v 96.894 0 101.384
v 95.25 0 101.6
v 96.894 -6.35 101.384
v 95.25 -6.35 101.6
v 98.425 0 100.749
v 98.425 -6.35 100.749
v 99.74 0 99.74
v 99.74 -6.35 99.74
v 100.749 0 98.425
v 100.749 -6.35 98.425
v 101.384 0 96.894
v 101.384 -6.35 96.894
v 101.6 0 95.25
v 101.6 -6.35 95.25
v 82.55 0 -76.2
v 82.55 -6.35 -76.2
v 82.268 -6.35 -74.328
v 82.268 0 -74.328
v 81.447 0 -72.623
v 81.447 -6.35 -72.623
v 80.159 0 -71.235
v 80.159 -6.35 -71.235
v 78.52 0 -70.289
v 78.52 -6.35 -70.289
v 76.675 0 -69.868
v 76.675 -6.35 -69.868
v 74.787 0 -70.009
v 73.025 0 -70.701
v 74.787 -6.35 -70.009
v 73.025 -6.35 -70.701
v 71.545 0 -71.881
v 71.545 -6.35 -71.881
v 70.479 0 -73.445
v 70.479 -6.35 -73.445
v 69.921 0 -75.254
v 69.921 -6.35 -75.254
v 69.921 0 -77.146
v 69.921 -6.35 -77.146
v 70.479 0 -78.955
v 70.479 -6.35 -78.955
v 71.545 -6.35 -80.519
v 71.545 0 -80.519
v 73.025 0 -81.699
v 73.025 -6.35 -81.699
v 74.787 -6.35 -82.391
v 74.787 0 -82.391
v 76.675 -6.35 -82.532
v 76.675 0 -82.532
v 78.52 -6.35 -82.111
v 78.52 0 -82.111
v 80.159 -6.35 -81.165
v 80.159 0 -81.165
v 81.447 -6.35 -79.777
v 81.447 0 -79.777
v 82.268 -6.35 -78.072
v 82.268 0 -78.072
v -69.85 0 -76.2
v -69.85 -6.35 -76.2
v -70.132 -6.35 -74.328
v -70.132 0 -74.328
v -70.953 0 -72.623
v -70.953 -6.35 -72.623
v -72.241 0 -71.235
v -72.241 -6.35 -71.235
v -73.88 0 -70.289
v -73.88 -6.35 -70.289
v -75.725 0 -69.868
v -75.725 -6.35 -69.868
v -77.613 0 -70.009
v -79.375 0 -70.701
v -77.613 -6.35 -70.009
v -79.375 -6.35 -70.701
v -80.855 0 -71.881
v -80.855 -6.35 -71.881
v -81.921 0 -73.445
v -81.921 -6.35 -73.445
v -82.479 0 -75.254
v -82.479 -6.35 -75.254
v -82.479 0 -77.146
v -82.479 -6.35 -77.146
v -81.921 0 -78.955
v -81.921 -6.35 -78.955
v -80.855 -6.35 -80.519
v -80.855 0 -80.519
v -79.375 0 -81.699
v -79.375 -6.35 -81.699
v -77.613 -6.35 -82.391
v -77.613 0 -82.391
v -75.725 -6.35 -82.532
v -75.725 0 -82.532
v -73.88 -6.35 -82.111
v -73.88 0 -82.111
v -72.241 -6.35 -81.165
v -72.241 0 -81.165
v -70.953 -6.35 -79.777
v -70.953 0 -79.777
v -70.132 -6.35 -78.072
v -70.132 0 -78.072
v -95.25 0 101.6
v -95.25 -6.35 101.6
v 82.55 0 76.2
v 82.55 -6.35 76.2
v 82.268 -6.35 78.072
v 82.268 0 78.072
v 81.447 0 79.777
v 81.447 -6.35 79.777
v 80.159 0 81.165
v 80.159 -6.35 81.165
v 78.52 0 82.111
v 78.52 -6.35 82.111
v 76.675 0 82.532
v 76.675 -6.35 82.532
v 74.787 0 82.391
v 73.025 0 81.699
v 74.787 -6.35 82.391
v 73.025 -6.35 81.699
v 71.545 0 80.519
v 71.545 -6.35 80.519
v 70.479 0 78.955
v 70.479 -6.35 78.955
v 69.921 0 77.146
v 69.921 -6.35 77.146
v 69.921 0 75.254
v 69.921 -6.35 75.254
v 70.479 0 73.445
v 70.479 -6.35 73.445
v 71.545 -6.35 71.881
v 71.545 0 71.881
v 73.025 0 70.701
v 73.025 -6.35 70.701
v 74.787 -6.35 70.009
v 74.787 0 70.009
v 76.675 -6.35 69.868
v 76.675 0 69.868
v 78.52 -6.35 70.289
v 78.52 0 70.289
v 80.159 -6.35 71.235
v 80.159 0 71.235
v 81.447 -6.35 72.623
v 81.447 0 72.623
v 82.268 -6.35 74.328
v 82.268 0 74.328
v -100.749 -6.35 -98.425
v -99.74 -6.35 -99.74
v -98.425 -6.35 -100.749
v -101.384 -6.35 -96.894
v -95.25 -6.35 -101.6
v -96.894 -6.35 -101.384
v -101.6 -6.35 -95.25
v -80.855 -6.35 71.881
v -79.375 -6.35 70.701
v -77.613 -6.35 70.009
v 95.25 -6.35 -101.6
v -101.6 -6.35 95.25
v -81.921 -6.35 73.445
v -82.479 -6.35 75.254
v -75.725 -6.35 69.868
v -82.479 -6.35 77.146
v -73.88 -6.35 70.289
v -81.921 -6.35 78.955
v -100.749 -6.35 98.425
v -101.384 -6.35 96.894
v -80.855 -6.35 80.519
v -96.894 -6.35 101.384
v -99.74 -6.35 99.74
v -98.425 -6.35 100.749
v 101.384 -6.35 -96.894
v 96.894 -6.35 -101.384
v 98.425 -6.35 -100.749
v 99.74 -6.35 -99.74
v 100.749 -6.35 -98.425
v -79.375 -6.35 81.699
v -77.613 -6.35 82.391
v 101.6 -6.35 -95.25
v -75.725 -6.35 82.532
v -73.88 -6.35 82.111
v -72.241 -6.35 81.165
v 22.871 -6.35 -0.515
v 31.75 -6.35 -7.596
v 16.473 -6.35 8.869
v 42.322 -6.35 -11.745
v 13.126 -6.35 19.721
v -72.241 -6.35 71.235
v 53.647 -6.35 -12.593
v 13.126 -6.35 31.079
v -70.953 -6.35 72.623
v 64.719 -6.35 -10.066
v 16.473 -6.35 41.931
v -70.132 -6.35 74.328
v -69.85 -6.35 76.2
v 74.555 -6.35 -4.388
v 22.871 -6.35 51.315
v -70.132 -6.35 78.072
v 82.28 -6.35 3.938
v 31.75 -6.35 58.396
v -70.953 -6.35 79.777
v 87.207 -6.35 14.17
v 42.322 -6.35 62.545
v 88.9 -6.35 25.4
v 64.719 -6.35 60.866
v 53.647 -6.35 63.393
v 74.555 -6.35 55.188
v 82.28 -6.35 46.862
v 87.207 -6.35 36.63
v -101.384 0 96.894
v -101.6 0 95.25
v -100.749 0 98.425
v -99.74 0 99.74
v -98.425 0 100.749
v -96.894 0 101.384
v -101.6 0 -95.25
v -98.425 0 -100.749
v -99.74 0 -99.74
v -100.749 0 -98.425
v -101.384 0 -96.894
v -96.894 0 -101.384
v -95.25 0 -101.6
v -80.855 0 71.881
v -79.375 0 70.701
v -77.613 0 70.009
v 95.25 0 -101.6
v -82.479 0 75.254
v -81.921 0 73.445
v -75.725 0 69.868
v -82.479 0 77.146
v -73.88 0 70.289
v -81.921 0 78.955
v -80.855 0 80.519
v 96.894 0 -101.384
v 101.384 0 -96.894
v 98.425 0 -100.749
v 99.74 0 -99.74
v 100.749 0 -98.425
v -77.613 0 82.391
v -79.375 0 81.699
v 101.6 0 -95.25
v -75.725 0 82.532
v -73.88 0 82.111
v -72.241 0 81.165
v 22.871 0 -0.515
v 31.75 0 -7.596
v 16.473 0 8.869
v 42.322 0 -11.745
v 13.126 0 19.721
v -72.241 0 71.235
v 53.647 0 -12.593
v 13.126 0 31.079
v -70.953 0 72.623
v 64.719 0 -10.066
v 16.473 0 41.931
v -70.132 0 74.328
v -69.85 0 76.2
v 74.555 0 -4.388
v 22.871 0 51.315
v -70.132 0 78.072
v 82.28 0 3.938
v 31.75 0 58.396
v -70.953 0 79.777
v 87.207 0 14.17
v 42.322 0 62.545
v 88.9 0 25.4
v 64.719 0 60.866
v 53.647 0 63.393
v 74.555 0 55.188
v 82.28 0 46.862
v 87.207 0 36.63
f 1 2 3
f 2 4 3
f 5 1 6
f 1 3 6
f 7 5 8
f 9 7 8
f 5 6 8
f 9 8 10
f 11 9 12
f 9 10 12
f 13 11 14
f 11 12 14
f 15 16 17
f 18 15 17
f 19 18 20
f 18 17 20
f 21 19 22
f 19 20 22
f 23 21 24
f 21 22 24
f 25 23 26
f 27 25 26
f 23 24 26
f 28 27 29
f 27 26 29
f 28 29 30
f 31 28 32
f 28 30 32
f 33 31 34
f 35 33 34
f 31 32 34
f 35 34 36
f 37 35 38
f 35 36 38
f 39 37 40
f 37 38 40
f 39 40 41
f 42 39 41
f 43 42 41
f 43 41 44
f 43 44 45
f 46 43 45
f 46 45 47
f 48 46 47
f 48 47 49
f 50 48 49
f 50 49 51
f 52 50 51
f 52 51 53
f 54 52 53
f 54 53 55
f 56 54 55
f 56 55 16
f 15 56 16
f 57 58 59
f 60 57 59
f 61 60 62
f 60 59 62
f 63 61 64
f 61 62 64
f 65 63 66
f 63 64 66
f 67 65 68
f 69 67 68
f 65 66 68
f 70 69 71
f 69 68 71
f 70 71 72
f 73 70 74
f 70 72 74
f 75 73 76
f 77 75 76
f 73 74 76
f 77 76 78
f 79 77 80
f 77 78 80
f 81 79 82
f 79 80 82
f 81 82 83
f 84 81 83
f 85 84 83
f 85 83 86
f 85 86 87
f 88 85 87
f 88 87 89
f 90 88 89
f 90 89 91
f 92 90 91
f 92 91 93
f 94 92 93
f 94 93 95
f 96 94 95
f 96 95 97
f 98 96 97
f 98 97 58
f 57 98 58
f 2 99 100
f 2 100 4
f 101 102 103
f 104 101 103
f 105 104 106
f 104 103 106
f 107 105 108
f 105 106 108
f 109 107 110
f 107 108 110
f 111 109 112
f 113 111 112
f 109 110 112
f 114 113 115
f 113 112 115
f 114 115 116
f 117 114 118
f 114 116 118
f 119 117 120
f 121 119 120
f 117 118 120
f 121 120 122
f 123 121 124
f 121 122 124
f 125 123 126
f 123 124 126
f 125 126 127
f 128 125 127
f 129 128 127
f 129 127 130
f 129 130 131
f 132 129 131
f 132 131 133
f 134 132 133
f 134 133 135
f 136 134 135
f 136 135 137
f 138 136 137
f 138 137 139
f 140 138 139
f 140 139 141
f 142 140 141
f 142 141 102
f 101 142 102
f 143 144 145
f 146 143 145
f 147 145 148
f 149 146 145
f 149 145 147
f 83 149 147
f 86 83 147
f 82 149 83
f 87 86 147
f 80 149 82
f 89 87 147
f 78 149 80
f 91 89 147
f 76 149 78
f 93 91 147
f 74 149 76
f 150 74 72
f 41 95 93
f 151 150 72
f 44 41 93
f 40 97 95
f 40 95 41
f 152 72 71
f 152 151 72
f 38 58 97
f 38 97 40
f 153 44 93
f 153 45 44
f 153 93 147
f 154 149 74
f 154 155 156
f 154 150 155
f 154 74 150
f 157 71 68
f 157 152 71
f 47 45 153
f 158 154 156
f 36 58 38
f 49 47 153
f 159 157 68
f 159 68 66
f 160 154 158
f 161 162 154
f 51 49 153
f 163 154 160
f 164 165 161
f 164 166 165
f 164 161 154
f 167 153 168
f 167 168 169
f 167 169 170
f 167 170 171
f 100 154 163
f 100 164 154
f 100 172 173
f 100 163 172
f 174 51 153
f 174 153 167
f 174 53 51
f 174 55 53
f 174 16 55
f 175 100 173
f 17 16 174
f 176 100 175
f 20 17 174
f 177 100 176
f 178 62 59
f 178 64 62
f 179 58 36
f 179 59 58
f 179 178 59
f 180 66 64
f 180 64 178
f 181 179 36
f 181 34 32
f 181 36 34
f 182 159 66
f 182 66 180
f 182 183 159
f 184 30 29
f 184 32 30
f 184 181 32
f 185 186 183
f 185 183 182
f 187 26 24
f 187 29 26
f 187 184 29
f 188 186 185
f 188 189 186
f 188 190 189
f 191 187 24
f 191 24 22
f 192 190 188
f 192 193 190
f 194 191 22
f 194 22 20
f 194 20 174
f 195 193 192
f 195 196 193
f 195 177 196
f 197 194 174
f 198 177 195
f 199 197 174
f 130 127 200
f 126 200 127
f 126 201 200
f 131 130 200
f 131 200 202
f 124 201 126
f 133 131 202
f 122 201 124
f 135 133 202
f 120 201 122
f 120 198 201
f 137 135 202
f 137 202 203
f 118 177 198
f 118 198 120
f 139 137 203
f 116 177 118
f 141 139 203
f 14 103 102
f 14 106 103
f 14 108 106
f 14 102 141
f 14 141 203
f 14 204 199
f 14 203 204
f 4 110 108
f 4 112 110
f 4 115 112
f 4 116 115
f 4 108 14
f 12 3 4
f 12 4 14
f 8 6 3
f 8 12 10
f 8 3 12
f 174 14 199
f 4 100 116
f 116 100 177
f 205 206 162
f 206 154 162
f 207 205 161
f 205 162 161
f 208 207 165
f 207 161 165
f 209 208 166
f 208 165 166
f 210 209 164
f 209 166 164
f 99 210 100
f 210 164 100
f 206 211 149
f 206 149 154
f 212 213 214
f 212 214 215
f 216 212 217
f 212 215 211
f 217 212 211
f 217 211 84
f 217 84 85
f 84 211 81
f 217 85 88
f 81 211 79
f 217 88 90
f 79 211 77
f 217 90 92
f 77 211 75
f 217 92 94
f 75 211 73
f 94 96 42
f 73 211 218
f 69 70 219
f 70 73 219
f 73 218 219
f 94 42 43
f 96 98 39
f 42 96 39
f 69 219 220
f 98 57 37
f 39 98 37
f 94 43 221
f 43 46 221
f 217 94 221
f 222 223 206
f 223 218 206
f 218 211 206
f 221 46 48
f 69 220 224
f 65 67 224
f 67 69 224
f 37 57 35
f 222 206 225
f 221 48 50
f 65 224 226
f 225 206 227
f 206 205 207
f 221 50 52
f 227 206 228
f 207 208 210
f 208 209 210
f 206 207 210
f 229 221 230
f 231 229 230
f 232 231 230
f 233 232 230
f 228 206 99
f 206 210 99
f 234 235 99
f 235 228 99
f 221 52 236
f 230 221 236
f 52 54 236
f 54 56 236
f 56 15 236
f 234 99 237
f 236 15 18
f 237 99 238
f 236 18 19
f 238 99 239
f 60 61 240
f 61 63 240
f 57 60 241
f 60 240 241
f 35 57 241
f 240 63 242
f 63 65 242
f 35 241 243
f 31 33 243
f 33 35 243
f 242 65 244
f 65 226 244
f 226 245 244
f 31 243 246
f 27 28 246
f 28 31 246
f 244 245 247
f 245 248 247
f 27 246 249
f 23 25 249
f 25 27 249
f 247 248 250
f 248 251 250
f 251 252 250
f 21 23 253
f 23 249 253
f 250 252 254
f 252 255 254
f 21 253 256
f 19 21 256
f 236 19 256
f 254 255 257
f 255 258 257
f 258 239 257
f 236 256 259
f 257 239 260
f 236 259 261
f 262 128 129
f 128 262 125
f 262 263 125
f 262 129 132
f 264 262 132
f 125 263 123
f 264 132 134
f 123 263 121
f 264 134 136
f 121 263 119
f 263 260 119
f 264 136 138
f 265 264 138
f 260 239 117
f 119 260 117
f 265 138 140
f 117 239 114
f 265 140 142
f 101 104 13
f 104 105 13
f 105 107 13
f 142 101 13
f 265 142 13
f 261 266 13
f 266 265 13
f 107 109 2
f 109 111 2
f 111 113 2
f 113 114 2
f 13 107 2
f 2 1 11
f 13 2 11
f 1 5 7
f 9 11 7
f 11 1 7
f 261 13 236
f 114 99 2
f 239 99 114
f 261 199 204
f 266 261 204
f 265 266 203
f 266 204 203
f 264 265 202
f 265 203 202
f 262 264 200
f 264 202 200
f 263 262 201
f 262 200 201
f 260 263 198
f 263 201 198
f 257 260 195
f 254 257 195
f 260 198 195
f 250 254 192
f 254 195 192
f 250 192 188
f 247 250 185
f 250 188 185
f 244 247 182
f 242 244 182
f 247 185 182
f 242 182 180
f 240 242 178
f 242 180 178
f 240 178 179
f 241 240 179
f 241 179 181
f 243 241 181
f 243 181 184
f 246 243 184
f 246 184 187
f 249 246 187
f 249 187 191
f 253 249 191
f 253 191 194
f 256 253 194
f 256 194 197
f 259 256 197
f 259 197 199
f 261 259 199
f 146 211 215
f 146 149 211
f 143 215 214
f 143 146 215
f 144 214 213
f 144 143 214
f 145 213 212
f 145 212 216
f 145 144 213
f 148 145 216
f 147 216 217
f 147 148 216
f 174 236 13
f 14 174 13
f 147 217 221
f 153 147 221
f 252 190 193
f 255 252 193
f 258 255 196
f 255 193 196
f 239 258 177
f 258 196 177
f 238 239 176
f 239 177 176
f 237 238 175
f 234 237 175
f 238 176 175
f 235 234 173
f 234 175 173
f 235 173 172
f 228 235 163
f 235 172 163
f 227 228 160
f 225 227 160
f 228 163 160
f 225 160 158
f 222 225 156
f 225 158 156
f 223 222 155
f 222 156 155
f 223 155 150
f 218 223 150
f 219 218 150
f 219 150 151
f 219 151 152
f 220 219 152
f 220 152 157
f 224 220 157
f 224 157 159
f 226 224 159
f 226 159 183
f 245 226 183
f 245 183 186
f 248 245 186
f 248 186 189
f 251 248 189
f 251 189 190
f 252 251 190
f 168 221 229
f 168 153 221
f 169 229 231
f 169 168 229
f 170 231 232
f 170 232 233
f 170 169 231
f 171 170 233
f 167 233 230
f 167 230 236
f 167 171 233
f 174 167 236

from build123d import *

# Parameters (mm, degrees)
F0_W     = 203.2
F0_H     = 203.2
F1_DEPTH = 6.35
F2_R     = 6.35
F3_DEPTH = 25.4
F4_R     = 6.35
F5_R     = 38.1
F6_DEPTH = 25.4


with BuildPart() as f1:
    # F0 (on Front) → F1 (new body)
    with BuildSketch(Plane.XZ):
        Rectangle(F0_W, F0_H)
    extrude(amount=F1_DEPTH)

    # F2 (on face) → F3 (cut)
    with BuildSketch(Plane.XZ.offset(6.35)):
        with Locations((-76.2, 76.2)):
            Circle(F2_R)
        with Locations((76.2, 76.2)):
            Circle(F2_R)
        with Locations((-76.2, -76.2)):
            Circle(F2_R)
        with Locations((76.2, -76.2)):
            Circle(F2_R)
    extrude(amount=-F3_DEPTH, mode=Mode.SUBTRACT)

    # F4
    f4_edges = [f1.edges().sort_by_distance(p)[0] for p in [
        (101.6, -3.175, 101.6),
        (-101.6, -3.175, 101.6),
        (-101.6, -3.175, -101.6),
        (101.6, -3.175, -101.6),
    ]]
    fillet(f4_edges, radius=F4_R)

    # F5 (on face) → F6 (cut)
    with BuildSketch(Plane.XZ.offset(6.35)):
        with Locations((50.8, 25.4)):
            Circle(F5_R)
    extrude(amount=-F6_DEPTH, mode=Mode.SUBTRACT)


solid = f1.part
